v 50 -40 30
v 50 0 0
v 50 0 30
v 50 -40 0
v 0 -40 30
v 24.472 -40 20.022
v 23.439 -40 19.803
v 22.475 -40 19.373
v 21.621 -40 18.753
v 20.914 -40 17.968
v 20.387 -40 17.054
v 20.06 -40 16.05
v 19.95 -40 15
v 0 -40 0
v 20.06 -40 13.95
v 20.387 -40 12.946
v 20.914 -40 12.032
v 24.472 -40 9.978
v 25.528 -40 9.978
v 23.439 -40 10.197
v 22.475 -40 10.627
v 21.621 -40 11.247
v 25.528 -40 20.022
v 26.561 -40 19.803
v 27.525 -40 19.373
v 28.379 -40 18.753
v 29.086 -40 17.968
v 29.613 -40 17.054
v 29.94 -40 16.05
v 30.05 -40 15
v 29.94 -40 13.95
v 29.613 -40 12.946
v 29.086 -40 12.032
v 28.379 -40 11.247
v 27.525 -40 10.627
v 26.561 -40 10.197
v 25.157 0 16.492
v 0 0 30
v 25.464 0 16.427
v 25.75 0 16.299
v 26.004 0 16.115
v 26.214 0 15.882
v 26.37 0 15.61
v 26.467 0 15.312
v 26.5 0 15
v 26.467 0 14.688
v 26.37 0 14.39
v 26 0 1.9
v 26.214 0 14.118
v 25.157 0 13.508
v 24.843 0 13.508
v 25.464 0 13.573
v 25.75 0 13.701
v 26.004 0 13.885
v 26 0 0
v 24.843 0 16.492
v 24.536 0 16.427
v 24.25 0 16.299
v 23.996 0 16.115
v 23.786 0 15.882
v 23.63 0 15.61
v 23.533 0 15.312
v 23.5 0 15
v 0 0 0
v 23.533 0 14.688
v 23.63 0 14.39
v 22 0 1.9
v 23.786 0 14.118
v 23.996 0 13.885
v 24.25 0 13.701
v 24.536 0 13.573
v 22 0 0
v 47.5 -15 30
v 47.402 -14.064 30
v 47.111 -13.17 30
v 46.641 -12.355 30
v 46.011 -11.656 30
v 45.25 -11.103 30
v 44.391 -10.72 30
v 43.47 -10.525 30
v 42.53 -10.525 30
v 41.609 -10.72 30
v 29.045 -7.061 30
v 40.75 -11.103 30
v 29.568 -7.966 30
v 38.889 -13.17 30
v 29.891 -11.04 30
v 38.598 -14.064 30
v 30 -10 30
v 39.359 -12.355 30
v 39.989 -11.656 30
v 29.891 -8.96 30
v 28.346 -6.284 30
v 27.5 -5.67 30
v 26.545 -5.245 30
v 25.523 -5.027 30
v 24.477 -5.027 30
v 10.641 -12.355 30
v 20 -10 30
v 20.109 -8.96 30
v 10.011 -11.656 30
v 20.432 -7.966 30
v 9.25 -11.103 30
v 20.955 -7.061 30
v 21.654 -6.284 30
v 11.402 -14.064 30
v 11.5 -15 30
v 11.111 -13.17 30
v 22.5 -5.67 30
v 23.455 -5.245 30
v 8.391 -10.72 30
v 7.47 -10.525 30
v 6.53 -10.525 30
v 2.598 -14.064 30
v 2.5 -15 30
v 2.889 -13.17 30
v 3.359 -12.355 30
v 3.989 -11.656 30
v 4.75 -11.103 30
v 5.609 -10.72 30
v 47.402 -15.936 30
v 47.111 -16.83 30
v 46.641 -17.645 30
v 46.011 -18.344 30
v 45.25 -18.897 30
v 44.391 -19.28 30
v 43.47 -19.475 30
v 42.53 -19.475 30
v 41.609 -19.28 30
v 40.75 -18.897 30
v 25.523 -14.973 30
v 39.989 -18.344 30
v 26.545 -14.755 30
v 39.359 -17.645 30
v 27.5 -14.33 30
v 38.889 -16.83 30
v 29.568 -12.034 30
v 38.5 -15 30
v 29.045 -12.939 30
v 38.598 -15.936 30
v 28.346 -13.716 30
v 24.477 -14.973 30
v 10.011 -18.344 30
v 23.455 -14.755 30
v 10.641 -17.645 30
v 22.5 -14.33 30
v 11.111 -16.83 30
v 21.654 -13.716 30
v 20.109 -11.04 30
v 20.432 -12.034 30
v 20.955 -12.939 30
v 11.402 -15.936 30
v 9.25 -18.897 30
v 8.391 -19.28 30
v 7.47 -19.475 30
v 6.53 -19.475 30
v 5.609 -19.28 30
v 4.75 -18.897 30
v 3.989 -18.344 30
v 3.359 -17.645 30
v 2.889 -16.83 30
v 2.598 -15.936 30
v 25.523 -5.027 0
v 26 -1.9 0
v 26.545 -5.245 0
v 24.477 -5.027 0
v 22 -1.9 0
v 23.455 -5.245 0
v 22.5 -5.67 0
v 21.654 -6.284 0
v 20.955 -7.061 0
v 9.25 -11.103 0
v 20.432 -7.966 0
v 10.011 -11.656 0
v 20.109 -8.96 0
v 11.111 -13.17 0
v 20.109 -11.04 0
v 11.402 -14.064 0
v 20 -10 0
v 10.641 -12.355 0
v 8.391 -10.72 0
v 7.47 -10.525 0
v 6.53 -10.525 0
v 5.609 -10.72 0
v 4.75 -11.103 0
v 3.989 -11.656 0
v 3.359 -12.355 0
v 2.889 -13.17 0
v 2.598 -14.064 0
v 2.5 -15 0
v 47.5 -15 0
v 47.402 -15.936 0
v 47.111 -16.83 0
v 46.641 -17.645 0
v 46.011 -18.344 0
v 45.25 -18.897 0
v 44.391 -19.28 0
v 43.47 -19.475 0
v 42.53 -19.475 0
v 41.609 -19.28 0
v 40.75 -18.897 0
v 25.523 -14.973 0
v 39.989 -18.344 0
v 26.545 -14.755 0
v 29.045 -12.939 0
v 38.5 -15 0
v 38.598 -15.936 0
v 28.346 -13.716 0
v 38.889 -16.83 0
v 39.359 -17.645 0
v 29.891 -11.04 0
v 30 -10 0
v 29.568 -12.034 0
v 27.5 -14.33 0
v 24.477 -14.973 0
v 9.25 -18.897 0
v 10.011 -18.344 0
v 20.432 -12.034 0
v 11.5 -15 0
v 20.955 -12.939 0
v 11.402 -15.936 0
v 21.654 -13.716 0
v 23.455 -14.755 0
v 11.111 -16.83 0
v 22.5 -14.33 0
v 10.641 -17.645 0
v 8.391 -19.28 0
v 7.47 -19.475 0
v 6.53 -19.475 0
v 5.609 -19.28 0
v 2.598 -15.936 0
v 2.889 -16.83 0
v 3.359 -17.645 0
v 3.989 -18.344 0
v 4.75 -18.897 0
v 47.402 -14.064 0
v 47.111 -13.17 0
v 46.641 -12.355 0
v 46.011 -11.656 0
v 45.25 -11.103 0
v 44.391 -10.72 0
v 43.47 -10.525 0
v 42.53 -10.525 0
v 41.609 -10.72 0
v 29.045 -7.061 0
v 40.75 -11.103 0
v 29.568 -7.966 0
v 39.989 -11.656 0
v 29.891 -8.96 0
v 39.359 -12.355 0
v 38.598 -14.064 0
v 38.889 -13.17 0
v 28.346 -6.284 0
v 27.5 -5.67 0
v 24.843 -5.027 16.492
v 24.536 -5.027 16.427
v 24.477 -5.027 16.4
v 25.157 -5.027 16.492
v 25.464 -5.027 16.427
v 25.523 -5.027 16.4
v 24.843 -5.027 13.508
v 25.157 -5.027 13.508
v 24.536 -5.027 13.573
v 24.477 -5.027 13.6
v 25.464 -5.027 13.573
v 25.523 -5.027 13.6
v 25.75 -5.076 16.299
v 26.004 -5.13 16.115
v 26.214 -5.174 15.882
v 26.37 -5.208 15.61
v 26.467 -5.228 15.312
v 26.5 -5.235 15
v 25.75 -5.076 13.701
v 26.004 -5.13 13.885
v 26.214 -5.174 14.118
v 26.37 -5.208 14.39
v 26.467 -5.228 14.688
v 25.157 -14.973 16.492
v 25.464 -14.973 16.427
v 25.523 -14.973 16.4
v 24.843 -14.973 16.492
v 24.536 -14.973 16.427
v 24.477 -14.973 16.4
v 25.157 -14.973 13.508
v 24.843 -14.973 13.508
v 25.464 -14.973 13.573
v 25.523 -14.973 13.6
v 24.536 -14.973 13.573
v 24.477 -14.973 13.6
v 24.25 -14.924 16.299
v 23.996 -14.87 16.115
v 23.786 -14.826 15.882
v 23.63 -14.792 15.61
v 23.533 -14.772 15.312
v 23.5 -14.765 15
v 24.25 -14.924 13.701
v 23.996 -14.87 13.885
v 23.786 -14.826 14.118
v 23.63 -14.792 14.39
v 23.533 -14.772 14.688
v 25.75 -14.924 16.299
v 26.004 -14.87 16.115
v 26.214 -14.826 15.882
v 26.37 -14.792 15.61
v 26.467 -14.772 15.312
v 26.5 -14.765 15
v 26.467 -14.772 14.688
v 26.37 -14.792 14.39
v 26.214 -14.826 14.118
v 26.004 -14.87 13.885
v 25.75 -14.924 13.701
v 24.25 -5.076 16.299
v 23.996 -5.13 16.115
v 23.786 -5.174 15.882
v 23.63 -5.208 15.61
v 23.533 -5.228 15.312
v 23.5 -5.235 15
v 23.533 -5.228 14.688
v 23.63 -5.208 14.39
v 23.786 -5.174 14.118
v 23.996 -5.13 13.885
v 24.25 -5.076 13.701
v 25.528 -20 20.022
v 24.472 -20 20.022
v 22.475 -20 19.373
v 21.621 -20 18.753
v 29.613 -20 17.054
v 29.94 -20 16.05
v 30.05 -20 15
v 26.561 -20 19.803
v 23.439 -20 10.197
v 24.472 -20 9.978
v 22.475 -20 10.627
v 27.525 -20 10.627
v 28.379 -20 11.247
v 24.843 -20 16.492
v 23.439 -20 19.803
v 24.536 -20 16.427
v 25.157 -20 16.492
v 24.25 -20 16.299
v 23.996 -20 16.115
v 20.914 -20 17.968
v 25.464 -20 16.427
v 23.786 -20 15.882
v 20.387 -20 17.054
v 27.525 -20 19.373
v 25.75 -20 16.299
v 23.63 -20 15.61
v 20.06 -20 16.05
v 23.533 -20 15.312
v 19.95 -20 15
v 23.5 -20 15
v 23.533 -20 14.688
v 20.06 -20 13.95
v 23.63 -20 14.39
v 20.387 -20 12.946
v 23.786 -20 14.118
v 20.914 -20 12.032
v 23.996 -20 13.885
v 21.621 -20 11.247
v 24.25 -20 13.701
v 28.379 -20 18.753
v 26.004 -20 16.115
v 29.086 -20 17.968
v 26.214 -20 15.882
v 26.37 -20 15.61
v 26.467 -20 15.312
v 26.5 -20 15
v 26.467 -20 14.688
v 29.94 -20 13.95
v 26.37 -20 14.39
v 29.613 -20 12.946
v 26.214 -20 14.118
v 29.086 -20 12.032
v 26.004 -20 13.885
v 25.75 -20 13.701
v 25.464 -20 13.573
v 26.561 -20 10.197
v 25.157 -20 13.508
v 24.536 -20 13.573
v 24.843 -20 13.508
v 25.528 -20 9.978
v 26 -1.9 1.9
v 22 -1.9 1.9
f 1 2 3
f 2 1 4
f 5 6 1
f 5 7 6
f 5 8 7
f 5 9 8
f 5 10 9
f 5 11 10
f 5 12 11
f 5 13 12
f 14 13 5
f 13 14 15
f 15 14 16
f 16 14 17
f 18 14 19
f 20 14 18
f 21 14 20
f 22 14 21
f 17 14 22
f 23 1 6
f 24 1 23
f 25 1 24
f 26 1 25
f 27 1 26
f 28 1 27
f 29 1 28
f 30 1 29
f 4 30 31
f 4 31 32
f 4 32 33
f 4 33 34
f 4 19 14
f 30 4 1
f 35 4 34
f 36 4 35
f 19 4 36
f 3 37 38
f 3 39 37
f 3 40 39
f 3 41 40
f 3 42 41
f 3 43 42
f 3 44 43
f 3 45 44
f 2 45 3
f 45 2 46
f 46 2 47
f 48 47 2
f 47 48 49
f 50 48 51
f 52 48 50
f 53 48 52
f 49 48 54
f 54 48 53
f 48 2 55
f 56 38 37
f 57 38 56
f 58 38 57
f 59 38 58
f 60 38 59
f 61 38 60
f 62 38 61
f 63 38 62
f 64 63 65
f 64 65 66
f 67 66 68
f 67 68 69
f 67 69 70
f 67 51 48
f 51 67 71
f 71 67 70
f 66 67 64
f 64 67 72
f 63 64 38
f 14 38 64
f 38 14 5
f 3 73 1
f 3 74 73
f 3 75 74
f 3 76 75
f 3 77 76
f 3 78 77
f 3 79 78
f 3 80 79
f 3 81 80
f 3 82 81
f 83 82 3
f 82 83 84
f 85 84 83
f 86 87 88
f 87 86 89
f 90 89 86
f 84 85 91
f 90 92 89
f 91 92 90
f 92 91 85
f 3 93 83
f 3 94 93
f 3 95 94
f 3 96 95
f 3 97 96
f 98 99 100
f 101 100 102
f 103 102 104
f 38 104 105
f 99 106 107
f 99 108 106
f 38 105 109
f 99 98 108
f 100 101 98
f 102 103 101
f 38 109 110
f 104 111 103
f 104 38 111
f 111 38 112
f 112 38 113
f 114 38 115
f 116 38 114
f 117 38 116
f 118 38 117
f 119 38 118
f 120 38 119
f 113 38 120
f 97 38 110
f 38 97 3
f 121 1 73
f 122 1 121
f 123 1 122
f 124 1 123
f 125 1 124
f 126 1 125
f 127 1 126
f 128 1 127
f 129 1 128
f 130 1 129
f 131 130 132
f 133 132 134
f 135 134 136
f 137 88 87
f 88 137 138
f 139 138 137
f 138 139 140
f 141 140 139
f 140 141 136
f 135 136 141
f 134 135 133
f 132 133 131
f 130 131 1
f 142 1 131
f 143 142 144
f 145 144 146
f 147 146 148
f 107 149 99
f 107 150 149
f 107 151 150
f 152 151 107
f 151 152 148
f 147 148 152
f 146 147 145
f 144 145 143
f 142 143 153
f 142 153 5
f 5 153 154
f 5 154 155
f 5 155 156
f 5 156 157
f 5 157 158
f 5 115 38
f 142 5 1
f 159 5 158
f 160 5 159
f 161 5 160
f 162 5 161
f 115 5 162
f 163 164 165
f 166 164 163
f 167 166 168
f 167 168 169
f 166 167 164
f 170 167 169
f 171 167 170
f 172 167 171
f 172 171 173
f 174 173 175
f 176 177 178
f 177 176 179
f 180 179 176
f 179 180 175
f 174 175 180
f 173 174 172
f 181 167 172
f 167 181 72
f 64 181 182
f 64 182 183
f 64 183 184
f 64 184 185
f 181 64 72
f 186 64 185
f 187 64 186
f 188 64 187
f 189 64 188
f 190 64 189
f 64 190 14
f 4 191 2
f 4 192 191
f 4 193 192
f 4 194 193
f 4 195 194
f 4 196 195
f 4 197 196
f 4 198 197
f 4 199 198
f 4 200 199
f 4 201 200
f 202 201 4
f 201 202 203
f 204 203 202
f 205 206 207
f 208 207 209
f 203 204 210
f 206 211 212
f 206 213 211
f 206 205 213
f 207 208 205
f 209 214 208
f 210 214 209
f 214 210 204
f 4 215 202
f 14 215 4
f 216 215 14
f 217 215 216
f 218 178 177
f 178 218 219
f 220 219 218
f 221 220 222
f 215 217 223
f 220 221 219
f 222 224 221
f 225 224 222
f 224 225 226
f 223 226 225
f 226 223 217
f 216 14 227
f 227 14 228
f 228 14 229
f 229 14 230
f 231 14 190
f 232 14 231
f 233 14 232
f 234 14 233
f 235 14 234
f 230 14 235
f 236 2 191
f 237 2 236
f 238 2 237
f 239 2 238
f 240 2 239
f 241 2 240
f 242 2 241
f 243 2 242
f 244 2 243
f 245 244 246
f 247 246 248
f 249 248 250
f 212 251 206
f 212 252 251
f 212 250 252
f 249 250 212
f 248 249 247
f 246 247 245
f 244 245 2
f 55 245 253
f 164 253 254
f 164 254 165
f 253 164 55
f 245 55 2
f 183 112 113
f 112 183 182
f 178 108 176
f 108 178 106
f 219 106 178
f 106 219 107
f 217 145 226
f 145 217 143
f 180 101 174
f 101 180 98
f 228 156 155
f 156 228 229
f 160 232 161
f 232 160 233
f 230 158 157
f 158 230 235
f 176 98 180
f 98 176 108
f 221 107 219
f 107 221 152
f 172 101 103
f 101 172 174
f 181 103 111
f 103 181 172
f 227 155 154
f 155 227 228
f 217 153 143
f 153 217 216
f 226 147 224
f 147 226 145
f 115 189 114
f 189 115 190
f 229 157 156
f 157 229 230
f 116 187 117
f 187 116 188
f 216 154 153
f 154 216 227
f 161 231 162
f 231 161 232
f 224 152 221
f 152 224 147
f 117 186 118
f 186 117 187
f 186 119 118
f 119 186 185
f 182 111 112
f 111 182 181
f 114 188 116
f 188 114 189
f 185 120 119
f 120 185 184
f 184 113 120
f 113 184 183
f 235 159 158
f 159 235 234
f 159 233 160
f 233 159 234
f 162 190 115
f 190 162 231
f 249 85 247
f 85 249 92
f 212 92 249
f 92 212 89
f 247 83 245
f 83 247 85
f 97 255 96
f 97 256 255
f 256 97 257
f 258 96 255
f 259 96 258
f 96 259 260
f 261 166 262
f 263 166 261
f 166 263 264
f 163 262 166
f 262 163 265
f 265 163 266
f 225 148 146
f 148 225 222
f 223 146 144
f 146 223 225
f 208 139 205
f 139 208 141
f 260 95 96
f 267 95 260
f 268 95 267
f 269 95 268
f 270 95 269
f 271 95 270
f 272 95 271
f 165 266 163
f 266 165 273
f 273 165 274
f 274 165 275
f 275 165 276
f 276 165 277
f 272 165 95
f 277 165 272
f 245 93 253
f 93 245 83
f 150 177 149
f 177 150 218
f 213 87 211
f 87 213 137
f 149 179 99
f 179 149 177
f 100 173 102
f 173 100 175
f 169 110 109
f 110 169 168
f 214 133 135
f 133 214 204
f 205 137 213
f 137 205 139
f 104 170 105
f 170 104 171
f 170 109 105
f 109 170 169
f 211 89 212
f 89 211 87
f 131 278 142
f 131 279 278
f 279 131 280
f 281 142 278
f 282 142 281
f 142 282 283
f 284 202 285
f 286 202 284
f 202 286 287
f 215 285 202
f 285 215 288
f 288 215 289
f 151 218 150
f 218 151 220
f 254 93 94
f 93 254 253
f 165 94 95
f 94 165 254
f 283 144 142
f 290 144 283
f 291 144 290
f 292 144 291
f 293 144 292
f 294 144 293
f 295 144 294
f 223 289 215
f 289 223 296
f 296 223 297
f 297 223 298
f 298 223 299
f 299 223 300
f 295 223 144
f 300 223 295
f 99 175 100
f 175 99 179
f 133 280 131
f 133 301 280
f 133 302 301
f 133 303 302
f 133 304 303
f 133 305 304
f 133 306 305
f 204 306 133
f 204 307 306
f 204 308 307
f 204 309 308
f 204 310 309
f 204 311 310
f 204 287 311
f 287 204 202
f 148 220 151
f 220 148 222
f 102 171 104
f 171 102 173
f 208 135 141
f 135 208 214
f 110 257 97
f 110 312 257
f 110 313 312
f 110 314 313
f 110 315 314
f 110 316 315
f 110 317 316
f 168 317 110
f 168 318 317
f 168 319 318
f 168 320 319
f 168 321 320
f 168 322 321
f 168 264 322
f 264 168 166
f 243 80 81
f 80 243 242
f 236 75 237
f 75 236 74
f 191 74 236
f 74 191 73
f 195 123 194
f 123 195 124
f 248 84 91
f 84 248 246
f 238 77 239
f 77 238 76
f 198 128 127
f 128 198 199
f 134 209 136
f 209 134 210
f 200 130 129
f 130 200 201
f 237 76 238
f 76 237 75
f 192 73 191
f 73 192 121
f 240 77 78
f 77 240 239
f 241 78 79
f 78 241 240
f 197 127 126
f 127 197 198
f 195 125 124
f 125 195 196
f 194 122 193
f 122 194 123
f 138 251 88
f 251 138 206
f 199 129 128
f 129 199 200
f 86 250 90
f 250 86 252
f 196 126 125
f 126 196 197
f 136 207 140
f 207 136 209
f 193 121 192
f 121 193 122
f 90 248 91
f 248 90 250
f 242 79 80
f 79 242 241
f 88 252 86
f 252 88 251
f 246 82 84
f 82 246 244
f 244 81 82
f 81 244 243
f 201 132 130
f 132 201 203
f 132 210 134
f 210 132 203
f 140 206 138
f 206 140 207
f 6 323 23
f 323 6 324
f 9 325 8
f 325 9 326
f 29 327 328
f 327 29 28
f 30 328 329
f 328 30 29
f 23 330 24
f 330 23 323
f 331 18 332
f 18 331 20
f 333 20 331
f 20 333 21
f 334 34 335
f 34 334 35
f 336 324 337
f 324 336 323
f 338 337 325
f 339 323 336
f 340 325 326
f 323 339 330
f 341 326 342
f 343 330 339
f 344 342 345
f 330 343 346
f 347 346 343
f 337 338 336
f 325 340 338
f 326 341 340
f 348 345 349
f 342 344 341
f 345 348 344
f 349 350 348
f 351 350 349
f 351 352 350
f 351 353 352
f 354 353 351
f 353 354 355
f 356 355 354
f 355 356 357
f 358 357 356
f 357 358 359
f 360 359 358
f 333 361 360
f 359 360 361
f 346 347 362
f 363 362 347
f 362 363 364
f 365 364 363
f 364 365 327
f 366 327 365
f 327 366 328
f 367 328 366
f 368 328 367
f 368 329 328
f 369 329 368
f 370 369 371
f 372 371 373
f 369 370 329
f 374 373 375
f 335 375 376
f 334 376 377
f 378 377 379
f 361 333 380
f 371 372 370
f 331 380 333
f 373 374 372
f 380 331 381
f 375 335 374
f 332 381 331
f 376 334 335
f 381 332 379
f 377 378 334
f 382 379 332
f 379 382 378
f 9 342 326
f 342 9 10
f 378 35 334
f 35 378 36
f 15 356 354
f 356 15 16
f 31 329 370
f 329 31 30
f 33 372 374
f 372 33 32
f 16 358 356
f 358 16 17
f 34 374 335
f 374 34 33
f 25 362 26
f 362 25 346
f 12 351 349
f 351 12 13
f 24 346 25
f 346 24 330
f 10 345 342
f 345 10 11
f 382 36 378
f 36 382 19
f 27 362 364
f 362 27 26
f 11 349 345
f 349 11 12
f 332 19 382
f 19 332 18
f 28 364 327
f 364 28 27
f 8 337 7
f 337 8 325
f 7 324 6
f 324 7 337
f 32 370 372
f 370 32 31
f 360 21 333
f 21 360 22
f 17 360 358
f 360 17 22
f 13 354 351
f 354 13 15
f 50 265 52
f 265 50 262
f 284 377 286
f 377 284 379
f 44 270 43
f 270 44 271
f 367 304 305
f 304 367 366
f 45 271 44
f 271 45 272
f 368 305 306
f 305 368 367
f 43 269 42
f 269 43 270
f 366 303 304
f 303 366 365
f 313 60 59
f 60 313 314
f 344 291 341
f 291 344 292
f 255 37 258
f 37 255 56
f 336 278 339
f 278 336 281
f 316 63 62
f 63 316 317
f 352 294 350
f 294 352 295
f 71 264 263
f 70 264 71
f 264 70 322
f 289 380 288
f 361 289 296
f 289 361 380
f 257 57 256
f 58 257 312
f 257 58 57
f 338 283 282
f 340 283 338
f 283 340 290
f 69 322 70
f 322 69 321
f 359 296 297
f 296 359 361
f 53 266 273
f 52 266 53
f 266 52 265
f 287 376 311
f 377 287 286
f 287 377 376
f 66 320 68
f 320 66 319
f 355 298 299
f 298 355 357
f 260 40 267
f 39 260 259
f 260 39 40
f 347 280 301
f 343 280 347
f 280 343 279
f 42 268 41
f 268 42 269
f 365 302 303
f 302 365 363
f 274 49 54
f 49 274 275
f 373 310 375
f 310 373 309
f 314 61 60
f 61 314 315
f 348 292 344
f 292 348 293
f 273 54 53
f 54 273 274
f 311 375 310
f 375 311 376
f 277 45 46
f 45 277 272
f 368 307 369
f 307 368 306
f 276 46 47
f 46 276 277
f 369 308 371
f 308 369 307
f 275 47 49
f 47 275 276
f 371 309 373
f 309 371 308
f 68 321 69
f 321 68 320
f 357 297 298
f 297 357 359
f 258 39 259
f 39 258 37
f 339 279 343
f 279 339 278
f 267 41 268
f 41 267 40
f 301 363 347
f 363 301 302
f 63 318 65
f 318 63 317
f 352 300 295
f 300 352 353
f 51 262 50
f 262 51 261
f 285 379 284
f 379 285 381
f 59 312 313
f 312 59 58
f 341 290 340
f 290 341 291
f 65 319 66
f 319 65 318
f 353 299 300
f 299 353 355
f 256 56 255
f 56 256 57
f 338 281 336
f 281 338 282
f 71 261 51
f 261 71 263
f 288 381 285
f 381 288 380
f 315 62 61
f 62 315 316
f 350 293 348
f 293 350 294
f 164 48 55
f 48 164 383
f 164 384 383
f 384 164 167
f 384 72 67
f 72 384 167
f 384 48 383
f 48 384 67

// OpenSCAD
//10mm hole block test.
spc=22;
$fn=30;
module btest(){
difference (){
  translate([-7,-7,0])cube([14,14,20],center=false);
  cylinder(d=10,h=21,center=false);  
    
}; };
module cham(){
  difference(){  
  cube([3,20,20],center=false);
   translate([-.1,20,0]) rotate([45,0,0])cube([4,15,30],center=false);  
};};
module flng(yt){
difference(){
cube([50,35,3],center=false);
translate([9,20,-.3])cylinder(d=4,h=4,center=false);
translate([25,30,-.3])cylinder(d=4,h=4,center=false);
    translate([41,20,-.3])cylinder(d=4,h=4,center=false);
};
translate([0,yt,3])cham();
translate([15.66,yt,3])cham();
translate([31.33,yt,3])cham();
translate([47,yt,3])cham();
};

module rods(hgt1, hgt2, hgt3,dt1,dt2,bearingd,bearingh){
translate([7,-.1,hgt1])rotate([270,0,0])cylinder(d=8.7,h=11,center=false);  
translate([9,-.1,hgt3])rotate([270,0,0])cylinder(d=4,h=11,center=false);
  union(){
translate([25,dt1,hgt2])rotate([270,0,0])cylinder(d=bearingd,h=bearingh,center=false);
 
translate([25,dt2,hgt2])rotate([270,0,0])cylinder(d=15.5,h=6.2,center=false);       
        };
translate([43,-.1,hgt1])rotate([270,0,0])cylinder(d=8.7,h=11,center=false);
translate([41,-.1,hgt3])rotate([270,0,0])cylinder(d=4,h=11,center=false);
    
};    
    
module ebraka(){
// 8mm rods 22m spacing  
  union(){  
    difference(){
       cube([50,10,40],center=false);
  rods(30,25,15,-.1,5.9,22.5,6.2);
//offset hole
        translate([32,-.1,37])rotate([270,0,0])cylinder(d=3,h=14,center=false);
translate([22,-.1,-.1])cube([4,3,3],center=false);
};
difference(){
flng(10);
translate([22,-.1,-.1])cube([4,2,2],center=false);
};
};
};//end blk

module ebrakb(){
//    
     union(){  
    difference(){
       cube([50,7,40],center=false);
   rods(30,25,15,-.1,-9,17,10);
//offset hole
translate([18,-.1,37])rotate([270,0,0])cylinder(d=3,h=14,center=false); 
      
 //clamp rods       
        translate([51,3.5,37])rotate([0,270,0])cylinder(d=2,h=12.6,center=false);
      translate([-1,3.5,37])rotate([0,90,0])cylinder(d=2,h=12.6,center=false);
        translate([13,-.1,28])cube([2,8,20],center=false);
        translate([11.5,-.1,34])cube([2,8,10],center=false);
        translate([6,-.1,30])cube([2,8,20],center=false);
      translate([35,-.1,28])cube([2,8,20],center=false);
 translate([36.5,-.1,34])cube([2,8,10],center=false);
translate([42,-.1,30])cube([2,8,20],center=false);
translate([22,-.1,-.1])cube([4,3,3],center=false);
};
   difference(){
 flng(7);   
translate([22,-.1,-.1])cube([4,3,3],center=false);
   };
};
};//end blk
module sblok(){
  //
    difference(){
       cube([50,30,40],center=false);
  translate([7,-.1,15])rotate([270,0,0])cylinder(d=9,h=31,center=false);  
        translate([25,-.1,10])rotate([270,0,0])cylinder(d=10,h=31,center=false);       
      translate([43,-.1,15])rotate([270,0,0])cylinder(d=9,h=31,center=false);
       // translate([18,-.1,17])cube([14,32,2],center=false);
        translate([25,15,20])cylinder(d=10.1,h=30,center=false);
   translate([25,15,-.1])cylinder(d=3,h=41,center=false);
translate([22,-.1,-.1])cube([4,2,2],center=false);
};
    
};//end blk

//cham();
//ebrakb();
//translate([-51,0,0])ebraka();
//translate([-102,0,0])sblok();
rotate([90,0,0])sblok();
